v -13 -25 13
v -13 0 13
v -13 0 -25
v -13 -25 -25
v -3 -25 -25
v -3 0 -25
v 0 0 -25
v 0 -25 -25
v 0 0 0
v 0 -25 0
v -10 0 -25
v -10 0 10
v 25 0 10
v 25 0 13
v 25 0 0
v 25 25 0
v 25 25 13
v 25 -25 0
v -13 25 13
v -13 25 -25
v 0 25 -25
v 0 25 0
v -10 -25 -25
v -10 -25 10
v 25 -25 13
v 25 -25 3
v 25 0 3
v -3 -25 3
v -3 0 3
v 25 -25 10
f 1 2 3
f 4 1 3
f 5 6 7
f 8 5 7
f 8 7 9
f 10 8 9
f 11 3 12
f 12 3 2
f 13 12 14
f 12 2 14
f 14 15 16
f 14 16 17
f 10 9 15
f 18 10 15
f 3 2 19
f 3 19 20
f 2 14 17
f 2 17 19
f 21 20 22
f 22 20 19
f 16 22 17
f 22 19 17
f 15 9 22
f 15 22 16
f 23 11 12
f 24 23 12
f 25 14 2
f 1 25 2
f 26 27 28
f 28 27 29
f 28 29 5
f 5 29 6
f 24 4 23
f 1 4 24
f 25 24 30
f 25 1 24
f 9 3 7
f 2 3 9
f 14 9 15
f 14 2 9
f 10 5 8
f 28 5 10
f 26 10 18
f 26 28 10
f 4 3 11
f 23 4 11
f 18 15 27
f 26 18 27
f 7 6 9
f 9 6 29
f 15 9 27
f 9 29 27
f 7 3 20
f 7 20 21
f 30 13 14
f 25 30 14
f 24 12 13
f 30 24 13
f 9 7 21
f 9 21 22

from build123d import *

# Parameters (mm, degrees)
F1_DEPTH = 25
F2_DEPTH = 25


with BuildPart() as f1:
    # F0 (on Front) → F1 (new body)
    with BuildSketch(Plane.XZ):
        Polygon((-13, -25), (-10, -25), (-10, 0), (-10, 10), (6.992714, 10), (25, 10), (25, 13), (6.992714, 13), (-13, 13), (-13, 0), align=None)
        Polygon((-3, -25), (0, -25), (0, 0), (25, 0), (25, 3), (-3, 3), align=None)
    extrude(amount=F1_DEPTH)


with BuildPart() as f2:
    # F0 (on Front) → F2 (new body)
    with BuildSketch(Plane.XZ):
        Polygon((-3, -25), (0, -25), (0, 0), (25, 0), (25, 3), (-3, 3), align=None)
        Polygon((-10, -25), (-3, -25), (-3, 3), (25, 3), (25, 10), (6.992714, 10), (-10, 10), (-10, 0), align=None)
        Polygon((-13, -25), (-10, -25), (-10, 0), (-10, 10), (6.992714, 10), (25, 10), (25, 13), (6.992714, 13), (-13, 13), (-13, 0), align=None)
    extrude(amount=-F2_DEPTH)


solid = Compound([f1.part, f2.part])
